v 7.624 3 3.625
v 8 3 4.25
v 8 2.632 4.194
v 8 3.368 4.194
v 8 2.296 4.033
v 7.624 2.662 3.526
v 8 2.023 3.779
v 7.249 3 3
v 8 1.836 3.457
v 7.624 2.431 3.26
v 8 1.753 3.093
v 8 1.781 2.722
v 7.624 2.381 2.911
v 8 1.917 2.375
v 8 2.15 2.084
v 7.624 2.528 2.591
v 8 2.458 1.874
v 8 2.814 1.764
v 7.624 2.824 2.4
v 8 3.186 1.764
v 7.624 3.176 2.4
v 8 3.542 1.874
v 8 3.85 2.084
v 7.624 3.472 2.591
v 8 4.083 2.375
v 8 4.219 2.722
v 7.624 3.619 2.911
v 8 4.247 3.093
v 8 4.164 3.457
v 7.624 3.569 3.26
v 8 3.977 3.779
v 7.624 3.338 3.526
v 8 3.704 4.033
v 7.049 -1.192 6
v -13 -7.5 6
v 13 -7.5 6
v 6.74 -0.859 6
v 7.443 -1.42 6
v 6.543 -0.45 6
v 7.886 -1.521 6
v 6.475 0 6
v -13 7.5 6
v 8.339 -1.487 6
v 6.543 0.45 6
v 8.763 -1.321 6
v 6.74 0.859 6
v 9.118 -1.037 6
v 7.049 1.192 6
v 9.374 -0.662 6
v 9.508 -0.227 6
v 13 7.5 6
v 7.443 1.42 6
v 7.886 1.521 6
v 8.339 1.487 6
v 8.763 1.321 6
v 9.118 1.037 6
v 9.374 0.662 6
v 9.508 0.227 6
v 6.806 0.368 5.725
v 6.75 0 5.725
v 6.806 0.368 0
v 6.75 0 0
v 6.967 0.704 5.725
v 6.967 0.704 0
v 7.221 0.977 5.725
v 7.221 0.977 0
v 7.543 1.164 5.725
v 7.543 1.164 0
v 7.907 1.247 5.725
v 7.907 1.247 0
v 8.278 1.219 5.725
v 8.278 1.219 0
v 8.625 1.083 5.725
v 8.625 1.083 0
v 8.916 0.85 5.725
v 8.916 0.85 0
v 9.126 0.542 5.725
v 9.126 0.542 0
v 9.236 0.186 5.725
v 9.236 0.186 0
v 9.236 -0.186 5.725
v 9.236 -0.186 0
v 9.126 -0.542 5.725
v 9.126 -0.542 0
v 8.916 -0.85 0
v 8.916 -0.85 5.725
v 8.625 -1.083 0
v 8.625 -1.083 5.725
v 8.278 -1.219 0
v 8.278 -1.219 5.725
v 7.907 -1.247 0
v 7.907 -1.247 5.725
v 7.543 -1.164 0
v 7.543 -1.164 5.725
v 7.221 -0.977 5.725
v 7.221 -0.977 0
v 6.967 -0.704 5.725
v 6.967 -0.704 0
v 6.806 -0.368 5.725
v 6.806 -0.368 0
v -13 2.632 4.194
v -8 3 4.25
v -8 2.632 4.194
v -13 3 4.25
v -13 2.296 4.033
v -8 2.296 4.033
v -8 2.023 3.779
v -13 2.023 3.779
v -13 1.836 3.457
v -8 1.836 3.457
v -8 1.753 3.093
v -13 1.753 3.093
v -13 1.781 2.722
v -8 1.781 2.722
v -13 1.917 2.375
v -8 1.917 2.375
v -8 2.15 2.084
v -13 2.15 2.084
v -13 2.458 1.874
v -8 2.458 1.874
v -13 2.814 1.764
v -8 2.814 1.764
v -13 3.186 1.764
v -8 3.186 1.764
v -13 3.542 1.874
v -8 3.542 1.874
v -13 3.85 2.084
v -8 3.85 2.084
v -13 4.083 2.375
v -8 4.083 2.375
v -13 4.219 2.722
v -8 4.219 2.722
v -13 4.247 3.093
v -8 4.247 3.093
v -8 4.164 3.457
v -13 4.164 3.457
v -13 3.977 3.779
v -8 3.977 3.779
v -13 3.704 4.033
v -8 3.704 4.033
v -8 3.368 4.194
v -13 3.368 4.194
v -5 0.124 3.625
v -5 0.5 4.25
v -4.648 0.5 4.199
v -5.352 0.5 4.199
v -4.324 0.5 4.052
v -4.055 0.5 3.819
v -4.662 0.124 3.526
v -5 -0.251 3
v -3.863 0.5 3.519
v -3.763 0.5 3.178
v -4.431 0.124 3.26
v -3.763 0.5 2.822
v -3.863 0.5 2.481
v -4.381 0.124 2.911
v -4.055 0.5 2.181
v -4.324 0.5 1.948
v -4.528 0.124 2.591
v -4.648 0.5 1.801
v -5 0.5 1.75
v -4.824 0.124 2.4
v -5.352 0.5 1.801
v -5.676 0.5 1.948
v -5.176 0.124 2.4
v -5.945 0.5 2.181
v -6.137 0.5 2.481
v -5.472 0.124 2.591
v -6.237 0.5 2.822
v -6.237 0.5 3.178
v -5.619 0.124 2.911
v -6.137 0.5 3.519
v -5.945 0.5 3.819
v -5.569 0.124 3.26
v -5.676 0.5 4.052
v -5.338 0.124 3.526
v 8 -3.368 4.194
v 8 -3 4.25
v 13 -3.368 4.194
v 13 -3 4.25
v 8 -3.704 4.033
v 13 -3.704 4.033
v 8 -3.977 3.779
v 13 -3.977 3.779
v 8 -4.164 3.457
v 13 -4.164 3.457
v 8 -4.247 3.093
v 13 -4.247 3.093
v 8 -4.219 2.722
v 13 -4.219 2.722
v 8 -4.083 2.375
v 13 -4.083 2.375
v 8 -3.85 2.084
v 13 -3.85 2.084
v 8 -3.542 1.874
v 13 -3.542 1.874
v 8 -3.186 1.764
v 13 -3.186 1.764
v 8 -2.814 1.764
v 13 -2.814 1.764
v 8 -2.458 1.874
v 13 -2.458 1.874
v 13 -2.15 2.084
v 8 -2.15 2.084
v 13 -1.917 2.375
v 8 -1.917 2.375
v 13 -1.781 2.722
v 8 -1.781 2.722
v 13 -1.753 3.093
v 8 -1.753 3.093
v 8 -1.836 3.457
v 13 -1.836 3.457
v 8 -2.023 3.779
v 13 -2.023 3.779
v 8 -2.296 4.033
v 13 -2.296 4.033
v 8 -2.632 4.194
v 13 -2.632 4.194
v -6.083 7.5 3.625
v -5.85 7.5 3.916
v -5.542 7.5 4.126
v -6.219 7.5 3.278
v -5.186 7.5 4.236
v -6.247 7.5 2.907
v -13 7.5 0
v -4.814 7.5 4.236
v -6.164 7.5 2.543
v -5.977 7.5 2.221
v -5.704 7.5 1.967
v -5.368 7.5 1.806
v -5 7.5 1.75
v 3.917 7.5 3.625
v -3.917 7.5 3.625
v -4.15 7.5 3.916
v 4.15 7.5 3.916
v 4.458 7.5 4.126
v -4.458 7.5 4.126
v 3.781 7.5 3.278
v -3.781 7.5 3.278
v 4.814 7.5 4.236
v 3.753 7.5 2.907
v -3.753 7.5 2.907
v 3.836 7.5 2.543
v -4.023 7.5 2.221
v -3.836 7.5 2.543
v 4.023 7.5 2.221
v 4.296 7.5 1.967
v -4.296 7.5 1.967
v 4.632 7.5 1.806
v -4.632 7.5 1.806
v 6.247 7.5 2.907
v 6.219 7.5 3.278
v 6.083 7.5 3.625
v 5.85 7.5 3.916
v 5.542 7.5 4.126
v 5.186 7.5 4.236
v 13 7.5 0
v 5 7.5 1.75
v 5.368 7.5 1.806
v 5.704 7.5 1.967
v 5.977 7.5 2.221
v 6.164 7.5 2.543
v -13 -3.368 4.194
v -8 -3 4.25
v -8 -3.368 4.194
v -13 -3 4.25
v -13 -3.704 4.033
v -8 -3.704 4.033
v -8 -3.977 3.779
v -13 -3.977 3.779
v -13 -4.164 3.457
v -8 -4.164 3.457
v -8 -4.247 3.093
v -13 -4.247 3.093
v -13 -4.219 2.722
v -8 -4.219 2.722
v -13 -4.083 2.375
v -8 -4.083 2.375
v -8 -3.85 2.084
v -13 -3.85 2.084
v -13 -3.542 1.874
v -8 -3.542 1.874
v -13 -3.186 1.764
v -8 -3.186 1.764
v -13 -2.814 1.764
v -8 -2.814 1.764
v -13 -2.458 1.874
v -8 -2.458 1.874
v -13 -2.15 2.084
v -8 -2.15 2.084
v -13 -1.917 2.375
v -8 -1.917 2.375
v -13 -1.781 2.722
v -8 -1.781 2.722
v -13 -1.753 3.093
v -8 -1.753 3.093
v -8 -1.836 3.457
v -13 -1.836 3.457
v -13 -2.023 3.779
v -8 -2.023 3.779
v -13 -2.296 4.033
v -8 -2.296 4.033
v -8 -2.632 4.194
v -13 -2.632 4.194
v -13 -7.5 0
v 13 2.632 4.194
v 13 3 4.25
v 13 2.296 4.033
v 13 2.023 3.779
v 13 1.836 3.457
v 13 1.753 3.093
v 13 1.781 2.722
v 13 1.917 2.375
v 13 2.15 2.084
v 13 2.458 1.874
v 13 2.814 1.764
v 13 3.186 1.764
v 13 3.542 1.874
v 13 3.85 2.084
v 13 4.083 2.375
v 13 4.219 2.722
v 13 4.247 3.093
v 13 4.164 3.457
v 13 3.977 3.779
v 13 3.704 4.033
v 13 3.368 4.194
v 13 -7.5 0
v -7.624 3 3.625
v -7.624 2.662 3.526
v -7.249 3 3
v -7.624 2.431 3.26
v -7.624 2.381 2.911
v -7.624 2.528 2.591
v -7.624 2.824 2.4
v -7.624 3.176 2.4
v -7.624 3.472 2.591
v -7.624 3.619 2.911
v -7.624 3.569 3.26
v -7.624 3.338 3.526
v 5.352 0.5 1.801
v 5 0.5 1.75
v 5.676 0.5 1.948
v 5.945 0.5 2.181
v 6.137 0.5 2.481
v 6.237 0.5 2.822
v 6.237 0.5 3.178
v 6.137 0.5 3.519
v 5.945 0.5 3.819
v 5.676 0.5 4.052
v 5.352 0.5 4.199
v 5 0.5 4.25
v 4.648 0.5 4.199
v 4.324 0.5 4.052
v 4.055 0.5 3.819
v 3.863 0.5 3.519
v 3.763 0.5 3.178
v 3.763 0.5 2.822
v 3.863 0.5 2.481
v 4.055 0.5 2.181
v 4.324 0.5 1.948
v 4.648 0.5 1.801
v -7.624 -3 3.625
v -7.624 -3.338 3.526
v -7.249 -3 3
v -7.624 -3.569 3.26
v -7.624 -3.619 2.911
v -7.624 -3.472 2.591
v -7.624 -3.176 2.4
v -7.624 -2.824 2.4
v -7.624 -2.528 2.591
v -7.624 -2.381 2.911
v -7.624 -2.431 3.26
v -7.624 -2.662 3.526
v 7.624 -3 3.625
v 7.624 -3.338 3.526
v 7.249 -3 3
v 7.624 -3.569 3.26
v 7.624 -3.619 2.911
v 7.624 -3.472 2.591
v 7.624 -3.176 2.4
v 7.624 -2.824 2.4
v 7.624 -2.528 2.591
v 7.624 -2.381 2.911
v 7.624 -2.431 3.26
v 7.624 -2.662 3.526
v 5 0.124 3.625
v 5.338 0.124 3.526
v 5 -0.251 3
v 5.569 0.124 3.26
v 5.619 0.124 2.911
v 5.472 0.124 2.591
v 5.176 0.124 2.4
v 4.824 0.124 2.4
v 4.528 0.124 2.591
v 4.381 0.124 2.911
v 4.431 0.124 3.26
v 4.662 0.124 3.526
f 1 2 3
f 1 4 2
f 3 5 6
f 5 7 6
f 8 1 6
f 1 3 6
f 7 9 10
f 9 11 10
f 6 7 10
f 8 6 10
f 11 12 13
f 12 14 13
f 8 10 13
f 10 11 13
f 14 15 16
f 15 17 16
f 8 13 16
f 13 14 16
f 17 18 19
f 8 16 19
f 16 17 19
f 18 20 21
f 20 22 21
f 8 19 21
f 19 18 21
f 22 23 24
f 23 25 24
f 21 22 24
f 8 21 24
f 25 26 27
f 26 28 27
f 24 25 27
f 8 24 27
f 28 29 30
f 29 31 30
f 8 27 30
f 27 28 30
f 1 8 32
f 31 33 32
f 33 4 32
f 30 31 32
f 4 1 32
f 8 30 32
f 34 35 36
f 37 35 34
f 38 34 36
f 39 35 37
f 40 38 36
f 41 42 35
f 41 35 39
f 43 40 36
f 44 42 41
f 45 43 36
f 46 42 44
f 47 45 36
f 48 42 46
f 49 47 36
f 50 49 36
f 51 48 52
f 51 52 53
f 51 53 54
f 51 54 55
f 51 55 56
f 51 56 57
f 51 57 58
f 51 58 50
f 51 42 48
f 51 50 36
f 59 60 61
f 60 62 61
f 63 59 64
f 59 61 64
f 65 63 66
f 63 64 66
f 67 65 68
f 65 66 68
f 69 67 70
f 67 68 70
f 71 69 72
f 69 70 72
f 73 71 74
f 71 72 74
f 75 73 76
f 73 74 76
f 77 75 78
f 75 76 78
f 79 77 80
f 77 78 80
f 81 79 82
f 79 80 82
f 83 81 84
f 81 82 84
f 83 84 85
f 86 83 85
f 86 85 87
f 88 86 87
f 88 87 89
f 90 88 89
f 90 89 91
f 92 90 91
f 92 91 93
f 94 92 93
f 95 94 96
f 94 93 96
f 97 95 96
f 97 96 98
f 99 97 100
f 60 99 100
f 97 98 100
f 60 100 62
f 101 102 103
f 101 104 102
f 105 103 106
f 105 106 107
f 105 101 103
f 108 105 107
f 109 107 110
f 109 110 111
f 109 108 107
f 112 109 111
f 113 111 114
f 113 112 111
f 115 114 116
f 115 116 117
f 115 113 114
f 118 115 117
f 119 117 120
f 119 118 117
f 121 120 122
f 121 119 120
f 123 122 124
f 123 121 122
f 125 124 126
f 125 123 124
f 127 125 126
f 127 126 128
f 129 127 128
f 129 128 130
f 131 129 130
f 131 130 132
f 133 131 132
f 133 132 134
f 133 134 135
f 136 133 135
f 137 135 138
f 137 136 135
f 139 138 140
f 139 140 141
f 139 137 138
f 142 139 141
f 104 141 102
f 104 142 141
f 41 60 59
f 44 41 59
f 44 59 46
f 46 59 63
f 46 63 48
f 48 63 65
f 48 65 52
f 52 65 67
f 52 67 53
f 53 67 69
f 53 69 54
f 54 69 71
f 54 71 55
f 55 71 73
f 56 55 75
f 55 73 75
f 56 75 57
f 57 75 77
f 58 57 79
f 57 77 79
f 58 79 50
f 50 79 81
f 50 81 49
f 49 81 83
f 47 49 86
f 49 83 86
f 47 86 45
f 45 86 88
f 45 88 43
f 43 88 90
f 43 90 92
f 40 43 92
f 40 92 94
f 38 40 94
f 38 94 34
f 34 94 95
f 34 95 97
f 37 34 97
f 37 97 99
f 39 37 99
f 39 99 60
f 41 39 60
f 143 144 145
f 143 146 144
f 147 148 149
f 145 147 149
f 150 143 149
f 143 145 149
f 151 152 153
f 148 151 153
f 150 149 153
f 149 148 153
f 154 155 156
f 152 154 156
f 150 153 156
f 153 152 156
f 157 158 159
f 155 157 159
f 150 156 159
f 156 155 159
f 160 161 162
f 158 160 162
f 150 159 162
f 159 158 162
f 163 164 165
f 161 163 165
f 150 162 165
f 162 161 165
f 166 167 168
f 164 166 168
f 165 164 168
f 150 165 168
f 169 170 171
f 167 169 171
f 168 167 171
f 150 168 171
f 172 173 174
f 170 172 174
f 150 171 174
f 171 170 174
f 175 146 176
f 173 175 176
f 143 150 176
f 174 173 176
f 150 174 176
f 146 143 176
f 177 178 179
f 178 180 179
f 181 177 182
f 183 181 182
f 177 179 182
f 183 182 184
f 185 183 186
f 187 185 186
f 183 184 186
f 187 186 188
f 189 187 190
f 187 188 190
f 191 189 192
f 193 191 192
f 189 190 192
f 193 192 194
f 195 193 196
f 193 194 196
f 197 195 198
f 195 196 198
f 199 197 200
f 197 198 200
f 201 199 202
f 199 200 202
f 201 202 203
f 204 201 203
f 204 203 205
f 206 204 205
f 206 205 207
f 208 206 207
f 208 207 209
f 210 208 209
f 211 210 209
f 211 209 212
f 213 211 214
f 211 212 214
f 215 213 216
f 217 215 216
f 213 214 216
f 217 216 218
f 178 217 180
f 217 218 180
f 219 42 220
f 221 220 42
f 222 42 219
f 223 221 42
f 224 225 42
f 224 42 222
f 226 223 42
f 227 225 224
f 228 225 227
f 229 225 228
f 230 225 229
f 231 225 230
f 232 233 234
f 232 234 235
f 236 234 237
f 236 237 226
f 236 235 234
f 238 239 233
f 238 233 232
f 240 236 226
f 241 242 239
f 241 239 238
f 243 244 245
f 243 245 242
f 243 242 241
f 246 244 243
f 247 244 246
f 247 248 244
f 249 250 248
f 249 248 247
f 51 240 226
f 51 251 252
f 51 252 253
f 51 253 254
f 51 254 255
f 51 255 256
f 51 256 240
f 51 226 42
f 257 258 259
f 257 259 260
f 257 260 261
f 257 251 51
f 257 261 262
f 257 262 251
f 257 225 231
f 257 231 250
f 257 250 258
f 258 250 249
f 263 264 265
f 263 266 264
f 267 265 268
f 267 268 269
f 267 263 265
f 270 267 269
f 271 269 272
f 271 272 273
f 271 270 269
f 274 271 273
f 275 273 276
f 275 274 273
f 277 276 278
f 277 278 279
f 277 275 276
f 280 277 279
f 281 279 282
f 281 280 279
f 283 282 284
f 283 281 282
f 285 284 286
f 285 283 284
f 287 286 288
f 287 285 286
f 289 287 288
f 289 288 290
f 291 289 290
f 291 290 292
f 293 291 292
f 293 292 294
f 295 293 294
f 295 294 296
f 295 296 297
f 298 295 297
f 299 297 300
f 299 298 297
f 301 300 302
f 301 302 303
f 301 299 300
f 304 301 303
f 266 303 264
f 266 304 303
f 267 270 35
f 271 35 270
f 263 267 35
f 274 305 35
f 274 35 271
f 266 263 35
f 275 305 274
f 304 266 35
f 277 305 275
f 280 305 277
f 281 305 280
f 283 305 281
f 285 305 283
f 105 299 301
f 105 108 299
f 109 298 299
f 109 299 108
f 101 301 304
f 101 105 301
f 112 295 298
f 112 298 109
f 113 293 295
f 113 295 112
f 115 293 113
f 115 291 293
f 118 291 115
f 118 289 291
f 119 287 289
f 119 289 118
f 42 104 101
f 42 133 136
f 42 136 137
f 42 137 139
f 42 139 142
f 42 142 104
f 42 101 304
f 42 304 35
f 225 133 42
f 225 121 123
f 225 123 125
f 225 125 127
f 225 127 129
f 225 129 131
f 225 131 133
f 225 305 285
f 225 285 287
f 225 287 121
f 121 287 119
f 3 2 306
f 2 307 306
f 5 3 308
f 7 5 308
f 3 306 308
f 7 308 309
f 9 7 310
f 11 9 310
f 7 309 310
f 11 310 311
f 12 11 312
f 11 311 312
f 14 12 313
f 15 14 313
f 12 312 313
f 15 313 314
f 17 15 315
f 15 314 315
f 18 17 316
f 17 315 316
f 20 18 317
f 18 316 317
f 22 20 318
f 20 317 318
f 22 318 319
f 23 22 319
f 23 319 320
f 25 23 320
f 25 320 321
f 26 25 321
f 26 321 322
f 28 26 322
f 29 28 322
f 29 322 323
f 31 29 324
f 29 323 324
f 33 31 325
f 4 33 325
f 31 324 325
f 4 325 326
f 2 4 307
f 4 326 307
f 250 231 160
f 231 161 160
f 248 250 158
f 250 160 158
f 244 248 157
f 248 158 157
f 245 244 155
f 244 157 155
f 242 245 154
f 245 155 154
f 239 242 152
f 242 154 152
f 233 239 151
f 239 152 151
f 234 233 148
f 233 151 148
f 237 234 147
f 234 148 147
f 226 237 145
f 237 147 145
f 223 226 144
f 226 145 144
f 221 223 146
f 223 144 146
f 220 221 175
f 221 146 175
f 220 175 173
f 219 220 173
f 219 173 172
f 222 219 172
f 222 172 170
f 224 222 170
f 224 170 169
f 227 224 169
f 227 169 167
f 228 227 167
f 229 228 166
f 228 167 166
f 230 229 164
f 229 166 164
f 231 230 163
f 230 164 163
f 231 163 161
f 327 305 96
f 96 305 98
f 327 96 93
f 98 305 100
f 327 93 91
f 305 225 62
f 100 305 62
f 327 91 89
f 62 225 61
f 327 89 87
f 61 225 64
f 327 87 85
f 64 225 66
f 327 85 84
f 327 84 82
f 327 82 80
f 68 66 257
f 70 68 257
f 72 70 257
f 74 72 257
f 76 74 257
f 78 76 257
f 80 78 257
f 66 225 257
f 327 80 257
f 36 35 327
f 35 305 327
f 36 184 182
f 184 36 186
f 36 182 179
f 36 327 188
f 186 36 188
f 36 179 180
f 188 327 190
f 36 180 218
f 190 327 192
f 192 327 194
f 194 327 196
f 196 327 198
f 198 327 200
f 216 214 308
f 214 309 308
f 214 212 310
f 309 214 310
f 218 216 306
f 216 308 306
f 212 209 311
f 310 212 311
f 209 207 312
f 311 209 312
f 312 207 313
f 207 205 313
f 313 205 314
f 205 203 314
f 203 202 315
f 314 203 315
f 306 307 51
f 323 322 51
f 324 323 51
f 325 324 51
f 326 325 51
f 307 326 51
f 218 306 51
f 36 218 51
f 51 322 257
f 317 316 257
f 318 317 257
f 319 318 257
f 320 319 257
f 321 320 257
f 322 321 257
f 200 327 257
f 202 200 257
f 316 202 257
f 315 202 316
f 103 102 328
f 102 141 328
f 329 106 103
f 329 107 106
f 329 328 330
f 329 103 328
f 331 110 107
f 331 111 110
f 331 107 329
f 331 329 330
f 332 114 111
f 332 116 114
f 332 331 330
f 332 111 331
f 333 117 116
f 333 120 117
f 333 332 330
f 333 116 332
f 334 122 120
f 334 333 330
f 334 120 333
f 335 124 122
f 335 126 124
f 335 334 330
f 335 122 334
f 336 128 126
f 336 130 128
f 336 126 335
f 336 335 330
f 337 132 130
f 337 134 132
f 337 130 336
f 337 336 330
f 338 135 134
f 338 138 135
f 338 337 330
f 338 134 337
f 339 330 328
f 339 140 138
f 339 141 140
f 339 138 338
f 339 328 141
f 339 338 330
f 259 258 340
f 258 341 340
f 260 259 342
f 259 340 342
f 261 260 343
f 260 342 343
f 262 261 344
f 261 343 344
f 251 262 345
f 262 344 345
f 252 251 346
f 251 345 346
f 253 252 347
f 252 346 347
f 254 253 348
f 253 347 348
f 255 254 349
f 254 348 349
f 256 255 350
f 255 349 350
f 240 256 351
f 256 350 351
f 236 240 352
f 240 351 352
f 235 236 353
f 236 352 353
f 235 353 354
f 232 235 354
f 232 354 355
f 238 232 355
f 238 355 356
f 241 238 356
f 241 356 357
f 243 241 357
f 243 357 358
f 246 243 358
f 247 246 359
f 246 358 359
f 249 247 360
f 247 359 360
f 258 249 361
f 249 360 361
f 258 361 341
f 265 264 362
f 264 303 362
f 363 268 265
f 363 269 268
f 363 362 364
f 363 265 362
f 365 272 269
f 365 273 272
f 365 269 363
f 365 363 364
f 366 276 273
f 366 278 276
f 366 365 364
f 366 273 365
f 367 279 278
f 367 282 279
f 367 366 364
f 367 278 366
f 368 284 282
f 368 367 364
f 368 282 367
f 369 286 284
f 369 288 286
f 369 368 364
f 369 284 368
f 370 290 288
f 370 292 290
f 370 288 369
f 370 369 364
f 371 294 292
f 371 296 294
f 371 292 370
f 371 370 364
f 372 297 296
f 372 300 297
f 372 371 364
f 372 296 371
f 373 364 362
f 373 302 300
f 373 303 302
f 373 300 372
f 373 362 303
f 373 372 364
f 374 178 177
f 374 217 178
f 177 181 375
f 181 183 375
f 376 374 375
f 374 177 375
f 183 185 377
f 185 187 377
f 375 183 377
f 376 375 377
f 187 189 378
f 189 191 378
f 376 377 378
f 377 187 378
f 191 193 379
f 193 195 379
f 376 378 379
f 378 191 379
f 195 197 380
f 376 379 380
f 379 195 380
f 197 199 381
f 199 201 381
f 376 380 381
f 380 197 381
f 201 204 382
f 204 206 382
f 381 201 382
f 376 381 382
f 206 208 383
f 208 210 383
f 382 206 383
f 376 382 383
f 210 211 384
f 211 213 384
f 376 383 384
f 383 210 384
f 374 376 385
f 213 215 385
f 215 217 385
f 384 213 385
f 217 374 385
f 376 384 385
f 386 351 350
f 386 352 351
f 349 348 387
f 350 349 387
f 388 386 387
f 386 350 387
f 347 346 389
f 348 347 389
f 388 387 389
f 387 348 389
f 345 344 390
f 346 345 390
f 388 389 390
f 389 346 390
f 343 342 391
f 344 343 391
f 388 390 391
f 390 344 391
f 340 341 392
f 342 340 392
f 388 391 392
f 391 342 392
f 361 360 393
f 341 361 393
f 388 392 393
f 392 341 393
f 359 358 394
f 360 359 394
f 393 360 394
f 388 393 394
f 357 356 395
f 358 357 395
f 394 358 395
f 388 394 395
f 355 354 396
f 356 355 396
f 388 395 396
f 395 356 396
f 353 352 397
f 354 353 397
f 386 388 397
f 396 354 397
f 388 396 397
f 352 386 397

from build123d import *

# Parameters (mm, degrees)
SKETCH_1_W                   = 26
SKETCH_1_H                   = 15
EXTRUDE_1_DEPTH              = 5
SKETCH_2_W                   = 26
SKETCH_2_H                   = 15
EXTRUDE_2_DEPTH              = 1
HOLE_WIZARD_M3_1_AT_2_COUNT  = 2
HOLE_WIZARD_M3_1_AT_2_PITCH  = 6
HOLE_WIZARD_M3_2_D           = 2.5
HOLE_WIZARD_M3_2_DEPTH       = 7
HOLE_WIZARD_M3_2_TIP         = 0.751075774
HOLE_WIZARD_M3_3_D           = 2.5
HOLE_WIZARD_M3_3_CSINK_D     = 3.05
HOLE_WIZARD_M3_3_CSINK_ANGLE = 90


with BuildPart() as part:
    # 草图1 → 凸台-拉伸1 (new body)
    with BuildSketch(Plane.XY):
        Rectangle(SKETCH_1_W, SKETCH_1_H)
    extrude(amount=EXTRUDE_1_DEPTH)

    # 草图2 → 凸台-拉伸2 (add)
    with BuildSketch(Plane.XY.offset(5)):
        Rectangle(SKETCH_2_W, SKETCH_2_H)
    extrude(amount=EXTRUDE_2_DEPTH)

    # 草图4 → M3 螺纹孔1 (revolve, cut)
    with BuildSketch(Plane(origin=(-13, -3, 3), x_dir=(0, 0, 1), z_dir=(0, 1, 0))):
        Polygon((0, 0), (0, 5.751075774), (1.25, 5), (1.25, 0), align=None)
    hole_wizard_m3_1 = revolve(axis=Axis((-19.35, -3, 3), (1, 0, 0)), mode=Mode.SUBTRACT)

    # M3 螺纹孔1 at 2: M3 螺纹孔1 ×2
    with Locations(*[(0, i * HOLE_WIZARD_M3_1_AT_2_PITCH, 0) for i in range(1, HOLE_WIZARD_M3_1_AT_2_COUNT)]):
        add(hole_wizard_m3_1, mode=Mode.SUBTRACT)

    # 镜向1: M3 螺纹孔1 across plane
    add(hole_wizard_m3_1.mirror(Plane(origin=(0, 0, 0), x_dir=(0, 0, 1), z_dir=(1, 0, 0))), mode=Mode.SUBTRACT)

    # 镜向1 copy 1 sketch → 镜向1 copy 1 (revolve, cut)
    with BuildSketch(Plane(origin=(13, 3, 3), x_dir=(0, 0, 1), z_dir=(0, 1, 0))):
        Polygon((0, 0), (0, -5.751075774), (1.25, -5), (1.25, 0), align=None)
    revolve(axis=Axis((19.35, 3, 3), (1, 0, 0)), mode=Mode.SUBTRACT)

    # M3 螺纹孔2
    with Locations(Plane(origin=(-5, 7.5, 3), x_dir=(0, 0, 1), z_dir=(0, 1, 0))):
        with Locations((0, 0), (0, 10)):
            Hole(HOLE_WIZARD_M3_2_D / 2, depth=HOLE_WIZARD_M3_2_DEPTH)
            with Locations((0, 0, -(HOLE_WIZARD_M3_2_DEPTH + HOLE_WIZARD_M3_2_TIP / 2))):  # 118° drill point
                Cone(0, HOLE_WIZARD_M3_2_D / 2, HOLE_WIZARD_M3_2_TIP, mode=Mode.SUBTRACT)

    # M3 螺纹孔3 (through all)
    with Locations(Plane.XY.offset(6)):
        with Locations((8, 0)):
            CounterSinkHole(HOLE_WIZARD_M3_3_D / 2, HOLE_WIZARD_M3_3_CSINK_D / 2, counter_sink_angle=HOLE_WIZARD_M3_3_CSINK_ANGLE)


solid = part.part
